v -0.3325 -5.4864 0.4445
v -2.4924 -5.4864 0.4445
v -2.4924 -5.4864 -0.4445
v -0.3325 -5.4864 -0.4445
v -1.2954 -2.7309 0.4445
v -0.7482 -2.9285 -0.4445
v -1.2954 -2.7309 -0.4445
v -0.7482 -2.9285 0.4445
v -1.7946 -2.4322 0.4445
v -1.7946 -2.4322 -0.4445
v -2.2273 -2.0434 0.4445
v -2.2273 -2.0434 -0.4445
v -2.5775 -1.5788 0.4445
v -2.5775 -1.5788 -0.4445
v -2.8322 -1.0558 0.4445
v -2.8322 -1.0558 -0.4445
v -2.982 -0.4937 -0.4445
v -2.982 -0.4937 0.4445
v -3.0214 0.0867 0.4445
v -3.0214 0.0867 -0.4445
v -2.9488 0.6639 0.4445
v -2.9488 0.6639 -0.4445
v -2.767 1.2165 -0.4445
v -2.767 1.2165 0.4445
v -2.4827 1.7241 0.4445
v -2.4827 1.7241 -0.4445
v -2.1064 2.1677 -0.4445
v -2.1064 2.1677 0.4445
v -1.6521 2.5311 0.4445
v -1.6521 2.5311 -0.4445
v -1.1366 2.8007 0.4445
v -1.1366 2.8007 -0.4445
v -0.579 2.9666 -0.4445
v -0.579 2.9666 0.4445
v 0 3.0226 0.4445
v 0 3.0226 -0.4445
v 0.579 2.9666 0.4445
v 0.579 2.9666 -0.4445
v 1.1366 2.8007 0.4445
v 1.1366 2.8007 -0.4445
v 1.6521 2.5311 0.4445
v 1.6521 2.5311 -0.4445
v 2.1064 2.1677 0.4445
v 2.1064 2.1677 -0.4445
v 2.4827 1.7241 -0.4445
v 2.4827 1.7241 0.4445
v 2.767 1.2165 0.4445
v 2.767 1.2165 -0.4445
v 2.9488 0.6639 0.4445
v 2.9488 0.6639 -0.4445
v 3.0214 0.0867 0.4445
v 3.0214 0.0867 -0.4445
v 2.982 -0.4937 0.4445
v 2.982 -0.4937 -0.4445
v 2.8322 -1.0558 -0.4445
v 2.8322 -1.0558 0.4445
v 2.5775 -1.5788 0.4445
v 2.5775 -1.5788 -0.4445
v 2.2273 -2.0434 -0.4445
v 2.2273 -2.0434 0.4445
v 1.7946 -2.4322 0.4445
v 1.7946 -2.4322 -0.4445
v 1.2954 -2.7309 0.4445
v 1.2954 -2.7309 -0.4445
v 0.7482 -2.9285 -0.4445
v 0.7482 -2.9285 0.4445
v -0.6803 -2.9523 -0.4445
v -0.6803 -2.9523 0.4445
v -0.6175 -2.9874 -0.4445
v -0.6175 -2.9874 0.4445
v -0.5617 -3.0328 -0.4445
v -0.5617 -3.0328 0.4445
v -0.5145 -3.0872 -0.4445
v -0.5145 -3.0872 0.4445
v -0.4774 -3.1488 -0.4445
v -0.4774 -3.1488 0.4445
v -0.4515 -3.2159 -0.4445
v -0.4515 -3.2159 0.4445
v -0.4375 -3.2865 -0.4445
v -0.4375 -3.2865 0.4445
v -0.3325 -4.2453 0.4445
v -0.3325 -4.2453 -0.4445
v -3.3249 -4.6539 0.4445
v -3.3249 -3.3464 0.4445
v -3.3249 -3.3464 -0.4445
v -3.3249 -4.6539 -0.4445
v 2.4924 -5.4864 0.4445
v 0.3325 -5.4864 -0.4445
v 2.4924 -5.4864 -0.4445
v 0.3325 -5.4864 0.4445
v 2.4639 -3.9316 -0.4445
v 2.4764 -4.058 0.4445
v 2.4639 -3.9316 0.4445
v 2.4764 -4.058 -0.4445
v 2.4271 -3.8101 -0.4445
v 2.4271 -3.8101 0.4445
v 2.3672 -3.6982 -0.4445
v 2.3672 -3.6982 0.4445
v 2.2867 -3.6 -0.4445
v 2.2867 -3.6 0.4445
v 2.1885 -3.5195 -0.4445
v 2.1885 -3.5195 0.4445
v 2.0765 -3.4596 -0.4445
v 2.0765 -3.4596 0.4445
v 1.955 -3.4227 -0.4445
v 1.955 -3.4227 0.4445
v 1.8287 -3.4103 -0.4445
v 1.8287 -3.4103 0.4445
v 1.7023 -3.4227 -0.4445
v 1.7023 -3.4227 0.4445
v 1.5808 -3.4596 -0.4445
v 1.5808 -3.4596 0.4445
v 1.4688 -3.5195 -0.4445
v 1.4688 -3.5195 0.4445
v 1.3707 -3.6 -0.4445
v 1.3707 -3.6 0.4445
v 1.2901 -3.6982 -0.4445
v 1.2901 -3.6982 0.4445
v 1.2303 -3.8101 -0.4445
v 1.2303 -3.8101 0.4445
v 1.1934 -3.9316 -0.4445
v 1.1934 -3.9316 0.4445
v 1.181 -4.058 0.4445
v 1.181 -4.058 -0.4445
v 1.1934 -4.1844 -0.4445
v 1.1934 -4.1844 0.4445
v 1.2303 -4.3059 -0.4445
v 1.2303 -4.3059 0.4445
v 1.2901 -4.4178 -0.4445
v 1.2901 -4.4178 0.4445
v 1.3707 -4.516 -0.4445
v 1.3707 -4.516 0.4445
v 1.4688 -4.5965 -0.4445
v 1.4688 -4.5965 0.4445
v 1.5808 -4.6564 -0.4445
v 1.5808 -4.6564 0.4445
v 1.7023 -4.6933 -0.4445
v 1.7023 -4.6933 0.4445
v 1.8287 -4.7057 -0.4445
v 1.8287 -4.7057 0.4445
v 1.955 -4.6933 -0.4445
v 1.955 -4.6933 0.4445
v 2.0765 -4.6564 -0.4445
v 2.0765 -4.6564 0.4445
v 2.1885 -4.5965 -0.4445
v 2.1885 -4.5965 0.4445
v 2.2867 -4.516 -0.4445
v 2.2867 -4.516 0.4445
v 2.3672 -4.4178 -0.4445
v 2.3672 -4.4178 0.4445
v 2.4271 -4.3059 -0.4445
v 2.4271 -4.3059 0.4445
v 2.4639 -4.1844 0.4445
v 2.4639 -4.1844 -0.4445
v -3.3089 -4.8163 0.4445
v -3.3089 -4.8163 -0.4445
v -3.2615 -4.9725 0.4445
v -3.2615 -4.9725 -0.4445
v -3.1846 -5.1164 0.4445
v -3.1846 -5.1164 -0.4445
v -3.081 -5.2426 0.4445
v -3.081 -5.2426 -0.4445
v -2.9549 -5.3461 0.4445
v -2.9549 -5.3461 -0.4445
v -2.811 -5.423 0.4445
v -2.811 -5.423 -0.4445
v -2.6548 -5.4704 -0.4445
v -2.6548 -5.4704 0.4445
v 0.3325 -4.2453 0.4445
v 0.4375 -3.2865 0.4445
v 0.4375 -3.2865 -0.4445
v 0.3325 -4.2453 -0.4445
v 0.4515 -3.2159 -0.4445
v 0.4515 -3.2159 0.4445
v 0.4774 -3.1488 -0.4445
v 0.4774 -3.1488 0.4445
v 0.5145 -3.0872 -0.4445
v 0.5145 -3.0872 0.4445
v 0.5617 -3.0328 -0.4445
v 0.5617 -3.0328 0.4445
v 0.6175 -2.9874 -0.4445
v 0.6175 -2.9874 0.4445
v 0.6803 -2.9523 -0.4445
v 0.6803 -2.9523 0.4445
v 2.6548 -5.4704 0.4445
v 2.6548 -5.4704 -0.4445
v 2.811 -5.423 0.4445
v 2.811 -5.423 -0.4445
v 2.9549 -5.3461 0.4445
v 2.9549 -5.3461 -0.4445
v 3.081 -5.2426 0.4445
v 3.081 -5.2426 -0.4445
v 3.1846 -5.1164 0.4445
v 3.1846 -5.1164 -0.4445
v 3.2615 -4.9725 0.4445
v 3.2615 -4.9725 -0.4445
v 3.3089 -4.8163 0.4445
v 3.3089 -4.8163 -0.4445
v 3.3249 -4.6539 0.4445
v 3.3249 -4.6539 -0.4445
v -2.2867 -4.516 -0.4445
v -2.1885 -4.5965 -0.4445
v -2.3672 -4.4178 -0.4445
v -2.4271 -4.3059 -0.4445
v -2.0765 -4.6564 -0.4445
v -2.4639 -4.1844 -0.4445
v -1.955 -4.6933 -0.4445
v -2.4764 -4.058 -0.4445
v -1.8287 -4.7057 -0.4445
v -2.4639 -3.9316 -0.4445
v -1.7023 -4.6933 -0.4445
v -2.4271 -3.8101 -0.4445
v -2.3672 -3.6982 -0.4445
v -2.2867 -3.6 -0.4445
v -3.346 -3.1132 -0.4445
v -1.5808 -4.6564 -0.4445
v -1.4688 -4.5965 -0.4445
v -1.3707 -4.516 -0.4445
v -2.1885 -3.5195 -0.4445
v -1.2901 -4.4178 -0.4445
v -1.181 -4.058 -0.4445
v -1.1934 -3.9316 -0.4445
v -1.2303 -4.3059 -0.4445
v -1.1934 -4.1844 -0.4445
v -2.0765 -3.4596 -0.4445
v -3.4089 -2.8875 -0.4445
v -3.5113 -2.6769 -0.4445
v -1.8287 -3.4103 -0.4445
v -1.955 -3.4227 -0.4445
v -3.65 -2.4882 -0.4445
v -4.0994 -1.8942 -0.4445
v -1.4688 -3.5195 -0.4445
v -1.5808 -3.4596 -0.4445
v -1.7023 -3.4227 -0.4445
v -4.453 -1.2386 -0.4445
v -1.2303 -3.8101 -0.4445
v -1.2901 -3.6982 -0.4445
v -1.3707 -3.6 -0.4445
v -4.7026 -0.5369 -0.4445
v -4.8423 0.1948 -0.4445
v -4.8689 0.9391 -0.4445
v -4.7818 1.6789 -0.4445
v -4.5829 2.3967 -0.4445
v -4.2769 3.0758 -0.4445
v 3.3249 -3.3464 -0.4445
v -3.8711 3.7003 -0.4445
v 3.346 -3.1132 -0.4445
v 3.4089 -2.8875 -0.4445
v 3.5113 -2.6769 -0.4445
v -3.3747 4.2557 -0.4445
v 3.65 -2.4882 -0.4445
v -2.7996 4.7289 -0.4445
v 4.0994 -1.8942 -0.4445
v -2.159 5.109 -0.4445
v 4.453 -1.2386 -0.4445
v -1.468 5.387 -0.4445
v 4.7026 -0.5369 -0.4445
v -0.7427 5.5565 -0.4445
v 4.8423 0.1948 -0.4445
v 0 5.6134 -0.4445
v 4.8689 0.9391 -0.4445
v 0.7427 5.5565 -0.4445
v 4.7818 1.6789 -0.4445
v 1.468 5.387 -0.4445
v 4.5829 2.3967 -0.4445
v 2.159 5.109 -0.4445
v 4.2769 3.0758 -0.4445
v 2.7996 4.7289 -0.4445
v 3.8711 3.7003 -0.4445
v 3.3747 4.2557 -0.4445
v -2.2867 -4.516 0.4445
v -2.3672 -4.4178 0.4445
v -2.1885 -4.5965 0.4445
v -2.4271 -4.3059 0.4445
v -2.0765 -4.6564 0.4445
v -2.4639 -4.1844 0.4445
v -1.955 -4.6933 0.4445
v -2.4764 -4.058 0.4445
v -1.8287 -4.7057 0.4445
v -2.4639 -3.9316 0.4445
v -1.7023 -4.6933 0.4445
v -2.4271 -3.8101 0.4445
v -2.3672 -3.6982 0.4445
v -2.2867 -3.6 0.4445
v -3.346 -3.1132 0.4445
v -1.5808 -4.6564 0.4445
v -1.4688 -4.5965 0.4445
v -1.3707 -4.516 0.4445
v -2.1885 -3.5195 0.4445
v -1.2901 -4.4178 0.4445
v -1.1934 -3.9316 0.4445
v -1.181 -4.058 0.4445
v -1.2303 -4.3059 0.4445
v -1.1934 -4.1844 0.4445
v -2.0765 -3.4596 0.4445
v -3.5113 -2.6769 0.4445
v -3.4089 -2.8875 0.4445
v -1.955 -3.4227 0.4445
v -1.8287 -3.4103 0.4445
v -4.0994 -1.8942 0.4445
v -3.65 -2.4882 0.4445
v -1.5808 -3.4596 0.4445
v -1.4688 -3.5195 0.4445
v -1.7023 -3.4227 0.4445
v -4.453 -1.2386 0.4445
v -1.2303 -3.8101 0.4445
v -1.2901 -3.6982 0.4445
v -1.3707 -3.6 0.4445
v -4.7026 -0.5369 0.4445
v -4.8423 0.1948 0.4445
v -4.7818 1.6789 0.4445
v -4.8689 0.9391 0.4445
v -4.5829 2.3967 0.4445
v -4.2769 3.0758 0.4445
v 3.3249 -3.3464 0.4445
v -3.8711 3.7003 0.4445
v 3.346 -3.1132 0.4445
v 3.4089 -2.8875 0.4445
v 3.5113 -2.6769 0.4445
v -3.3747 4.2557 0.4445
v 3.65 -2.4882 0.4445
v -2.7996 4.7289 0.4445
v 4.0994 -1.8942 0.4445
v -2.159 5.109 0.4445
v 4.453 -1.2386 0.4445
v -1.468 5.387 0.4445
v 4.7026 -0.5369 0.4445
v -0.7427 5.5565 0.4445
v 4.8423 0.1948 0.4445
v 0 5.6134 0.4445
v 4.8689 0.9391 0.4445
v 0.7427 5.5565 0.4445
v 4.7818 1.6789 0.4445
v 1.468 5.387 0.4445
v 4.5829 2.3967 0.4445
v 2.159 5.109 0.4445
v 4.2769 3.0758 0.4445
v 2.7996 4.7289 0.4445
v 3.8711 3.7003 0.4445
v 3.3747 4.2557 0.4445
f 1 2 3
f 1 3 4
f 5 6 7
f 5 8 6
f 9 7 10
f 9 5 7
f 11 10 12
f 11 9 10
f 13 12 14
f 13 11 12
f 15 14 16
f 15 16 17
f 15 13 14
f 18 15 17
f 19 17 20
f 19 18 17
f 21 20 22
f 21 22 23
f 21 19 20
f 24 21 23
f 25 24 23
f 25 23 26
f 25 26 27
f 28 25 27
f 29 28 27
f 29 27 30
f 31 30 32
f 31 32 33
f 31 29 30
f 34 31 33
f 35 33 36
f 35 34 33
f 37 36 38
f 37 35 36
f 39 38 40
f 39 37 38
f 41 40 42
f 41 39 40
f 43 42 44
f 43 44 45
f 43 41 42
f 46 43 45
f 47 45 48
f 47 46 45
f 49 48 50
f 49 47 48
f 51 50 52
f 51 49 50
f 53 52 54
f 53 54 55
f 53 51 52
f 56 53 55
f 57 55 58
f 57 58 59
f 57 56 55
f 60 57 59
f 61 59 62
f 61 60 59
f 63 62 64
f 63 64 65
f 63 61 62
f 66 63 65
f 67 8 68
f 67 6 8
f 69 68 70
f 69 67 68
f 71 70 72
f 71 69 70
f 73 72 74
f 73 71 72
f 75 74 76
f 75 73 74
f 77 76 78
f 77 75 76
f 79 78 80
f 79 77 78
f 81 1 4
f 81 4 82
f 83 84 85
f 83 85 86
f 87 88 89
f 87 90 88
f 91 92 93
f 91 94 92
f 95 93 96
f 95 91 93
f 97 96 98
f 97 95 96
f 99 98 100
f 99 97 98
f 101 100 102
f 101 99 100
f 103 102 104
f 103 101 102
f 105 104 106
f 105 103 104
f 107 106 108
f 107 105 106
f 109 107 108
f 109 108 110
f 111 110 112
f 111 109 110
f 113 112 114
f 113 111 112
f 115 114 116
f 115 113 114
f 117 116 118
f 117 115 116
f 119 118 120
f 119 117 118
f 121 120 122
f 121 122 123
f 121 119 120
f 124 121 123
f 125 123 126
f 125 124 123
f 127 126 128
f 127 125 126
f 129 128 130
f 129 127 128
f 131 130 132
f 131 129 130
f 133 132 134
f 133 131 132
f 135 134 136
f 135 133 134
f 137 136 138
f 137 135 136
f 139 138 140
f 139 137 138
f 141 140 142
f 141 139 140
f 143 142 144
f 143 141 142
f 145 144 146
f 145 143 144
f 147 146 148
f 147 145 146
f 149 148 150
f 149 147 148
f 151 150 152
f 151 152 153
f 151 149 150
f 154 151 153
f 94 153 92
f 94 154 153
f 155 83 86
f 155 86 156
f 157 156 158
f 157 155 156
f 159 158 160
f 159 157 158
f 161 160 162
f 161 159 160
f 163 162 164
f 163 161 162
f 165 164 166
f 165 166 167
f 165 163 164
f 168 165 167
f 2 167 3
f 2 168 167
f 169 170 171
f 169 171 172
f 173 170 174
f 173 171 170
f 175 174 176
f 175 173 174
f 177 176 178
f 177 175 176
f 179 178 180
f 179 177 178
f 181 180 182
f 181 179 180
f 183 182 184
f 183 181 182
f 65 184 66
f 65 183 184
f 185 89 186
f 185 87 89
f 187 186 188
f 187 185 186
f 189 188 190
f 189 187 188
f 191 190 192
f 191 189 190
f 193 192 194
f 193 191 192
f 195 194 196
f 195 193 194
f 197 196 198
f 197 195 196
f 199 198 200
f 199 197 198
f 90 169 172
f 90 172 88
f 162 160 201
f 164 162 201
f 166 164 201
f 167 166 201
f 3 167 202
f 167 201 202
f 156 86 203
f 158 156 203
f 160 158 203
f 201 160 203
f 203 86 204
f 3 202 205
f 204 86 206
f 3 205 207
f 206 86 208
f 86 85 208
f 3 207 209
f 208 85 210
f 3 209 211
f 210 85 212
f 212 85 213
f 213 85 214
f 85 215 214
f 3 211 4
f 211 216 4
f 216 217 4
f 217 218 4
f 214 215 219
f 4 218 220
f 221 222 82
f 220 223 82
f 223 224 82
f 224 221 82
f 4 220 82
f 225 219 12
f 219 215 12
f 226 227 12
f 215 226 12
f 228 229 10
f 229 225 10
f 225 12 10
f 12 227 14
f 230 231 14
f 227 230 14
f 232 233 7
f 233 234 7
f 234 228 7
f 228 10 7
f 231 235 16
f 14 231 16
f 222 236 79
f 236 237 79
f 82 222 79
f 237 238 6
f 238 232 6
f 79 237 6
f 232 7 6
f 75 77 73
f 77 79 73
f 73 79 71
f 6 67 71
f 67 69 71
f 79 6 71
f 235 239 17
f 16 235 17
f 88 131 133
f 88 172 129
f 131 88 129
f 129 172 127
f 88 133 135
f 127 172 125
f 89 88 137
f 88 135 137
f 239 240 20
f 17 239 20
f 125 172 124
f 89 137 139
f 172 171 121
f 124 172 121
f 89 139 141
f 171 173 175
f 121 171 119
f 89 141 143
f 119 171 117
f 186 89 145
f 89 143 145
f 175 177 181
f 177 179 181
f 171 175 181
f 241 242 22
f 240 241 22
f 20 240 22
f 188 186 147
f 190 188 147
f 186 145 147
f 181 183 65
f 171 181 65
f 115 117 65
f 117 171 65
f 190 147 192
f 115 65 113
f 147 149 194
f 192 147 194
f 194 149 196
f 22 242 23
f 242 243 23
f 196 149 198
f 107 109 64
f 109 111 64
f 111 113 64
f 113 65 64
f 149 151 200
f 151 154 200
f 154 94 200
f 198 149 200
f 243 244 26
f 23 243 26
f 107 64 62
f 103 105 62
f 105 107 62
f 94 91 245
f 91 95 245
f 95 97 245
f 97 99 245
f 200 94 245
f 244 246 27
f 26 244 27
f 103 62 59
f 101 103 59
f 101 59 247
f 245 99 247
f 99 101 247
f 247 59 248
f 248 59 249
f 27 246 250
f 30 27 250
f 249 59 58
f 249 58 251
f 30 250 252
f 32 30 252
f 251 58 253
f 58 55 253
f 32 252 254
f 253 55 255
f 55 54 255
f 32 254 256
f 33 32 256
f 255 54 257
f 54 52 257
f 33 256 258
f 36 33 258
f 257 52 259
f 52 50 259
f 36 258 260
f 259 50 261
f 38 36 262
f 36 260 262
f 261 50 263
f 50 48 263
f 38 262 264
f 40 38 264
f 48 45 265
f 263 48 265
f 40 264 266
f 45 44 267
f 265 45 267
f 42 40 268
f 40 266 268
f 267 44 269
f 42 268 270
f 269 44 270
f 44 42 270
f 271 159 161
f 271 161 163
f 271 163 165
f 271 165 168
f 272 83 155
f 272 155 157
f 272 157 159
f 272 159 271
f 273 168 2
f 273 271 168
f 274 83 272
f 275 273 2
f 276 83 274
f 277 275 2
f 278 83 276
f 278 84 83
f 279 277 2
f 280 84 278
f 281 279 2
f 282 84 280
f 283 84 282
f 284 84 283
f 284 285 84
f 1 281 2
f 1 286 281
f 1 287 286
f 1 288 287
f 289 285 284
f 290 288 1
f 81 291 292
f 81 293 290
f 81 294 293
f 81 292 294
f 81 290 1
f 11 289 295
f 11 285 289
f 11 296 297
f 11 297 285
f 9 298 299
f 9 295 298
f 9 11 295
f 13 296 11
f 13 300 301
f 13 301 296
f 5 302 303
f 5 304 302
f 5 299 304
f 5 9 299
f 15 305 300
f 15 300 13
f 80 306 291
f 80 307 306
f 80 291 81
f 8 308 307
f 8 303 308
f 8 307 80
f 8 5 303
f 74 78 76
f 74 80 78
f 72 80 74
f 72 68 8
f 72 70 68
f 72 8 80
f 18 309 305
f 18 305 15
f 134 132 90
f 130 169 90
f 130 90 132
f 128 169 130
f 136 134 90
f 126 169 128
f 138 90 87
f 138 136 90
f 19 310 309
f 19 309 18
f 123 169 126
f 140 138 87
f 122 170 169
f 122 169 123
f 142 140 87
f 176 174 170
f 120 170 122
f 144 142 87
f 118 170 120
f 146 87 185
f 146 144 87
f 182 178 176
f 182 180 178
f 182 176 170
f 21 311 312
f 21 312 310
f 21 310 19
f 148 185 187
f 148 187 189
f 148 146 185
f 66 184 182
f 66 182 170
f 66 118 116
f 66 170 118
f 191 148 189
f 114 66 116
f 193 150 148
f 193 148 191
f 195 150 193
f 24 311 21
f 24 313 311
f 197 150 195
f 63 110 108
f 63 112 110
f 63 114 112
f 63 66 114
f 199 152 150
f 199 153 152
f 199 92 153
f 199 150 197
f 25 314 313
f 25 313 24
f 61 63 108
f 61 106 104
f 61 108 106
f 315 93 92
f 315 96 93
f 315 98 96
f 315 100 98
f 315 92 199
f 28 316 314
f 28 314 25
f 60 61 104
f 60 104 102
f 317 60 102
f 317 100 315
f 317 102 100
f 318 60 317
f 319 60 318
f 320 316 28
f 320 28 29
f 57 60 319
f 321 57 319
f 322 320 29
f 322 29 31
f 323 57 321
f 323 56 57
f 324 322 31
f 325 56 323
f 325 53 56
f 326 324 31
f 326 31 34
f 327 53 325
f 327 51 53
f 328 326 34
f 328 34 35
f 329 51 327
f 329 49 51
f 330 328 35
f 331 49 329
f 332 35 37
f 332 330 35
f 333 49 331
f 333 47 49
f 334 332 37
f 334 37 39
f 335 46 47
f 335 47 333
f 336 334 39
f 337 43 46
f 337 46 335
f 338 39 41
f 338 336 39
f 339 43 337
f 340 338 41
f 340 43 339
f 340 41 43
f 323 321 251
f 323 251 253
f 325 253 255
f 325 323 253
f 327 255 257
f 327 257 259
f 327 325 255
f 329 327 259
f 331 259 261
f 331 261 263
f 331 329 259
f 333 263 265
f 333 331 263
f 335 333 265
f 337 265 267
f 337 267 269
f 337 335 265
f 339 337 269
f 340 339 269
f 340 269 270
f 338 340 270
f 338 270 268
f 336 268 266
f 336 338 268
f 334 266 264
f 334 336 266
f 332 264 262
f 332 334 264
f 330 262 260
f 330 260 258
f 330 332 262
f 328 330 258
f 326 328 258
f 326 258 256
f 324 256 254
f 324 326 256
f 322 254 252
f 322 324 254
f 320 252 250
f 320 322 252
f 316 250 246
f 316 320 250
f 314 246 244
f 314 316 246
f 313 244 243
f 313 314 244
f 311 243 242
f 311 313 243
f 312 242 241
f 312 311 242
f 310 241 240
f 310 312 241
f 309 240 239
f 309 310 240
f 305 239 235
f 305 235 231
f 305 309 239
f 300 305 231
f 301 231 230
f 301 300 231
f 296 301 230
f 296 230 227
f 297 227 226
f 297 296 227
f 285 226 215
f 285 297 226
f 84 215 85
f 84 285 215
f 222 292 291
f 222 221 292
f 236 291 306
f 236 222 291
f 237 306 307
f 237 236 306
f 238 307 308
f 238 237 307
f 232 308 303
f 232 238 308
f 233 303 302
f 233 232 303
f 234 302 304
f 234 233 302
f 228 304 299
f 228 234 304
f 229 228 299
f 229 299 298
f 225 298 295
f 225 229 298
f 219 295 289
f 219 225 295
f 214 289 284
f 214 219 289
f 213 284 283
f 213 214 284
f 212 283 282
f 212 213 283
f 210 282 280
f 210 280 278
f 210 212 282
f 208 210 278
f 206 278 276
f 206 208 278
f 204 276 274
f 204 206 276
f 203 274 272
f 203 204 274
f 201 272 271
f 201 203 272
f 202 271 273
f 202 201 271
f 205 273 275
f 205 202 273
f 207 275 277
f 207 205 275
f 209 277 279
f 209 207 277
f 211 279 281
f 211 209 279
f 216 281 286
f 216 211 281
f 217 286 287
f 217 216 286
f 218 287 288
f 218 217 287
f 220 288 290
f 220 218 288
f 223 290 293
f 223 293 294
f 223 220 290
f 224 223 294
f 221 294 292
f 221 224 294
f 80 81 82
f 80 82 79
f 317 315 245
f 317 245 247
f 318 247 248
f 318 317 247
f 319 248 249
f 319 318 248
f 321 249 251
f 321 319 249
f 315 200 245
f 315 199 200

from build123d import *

# Parameters (mm, degrees)
SKETCH3_R               = 0.6477
BOSS_EXTRUDE1_DEPTH     = 0.4445
CUT_EXTRUDE1_DEPTH      = 1.4445
CUT_EXTRUDE1_DEPTH_BACK = 1.4445
FILLET1_R               = 0.4162425


with BuildPart() as part:
    # Sketch3 → Boss-Extrude1 (new body, symmetric)
    with BuildSketch(Plane.XY):
        with BuildLine():
            Line((3.32486, -4.653915), (3.32486, -3.346426518))
            ThreePointArc((3.32486, -3.346426518), (3.408862886, -2.887538523), (3.649976862, -2.488165606))
            ThreePointArc((3.649976862, -2.488165606), (0, 5.6134), (-3.649976862, -2.488165606))
            ThreePointArc((-3.649976862, -2.488165606), (-3.408862886, -2.887538523), (-3.32486, -3.346426518))
            Line((-3.32486, -3.346426518), (-3.32486, -4.653915))
            ThreePointArc((-3.32486, -4.653915), (-3.081030789, -5.242570789), (-2.492375, -5.4864))
            Line((-2.492375, -5.4864), (-0.332486, -5.4864))
            Line((-0.332486, -5.4864), (-0.332486, -3.004257615))
            ThreePointArc((-0.332486, -3.004257615), (0, 3.0226), (0.332486, -3.004257615))
            Line((0.332486, -3.004257615), (0.332486, -5.4864))
            Line((0.332486, -5.4864), (2.492375, -5.4864))
            ThreePointArc((2.492375, -5.4864), (3.081030789, -5.242570789), (3.32486, -4.653915))
        make_face()
        with Locations((-1.828673, -4.057999533)):
            Circle(SKETCH3_R, mode=Mode.SUBTRACT)
        with Locations((1.828673, -4.057999533)):
            Circle(SKETCH3_R, mode=Mode.SUBTRACT)
    extrude(amount=BOSS_EXTRUDE1_DEPTH, both=True)

    # Sketch4 → Cut-Extrude1 (cut, two sides)
    with BuildSketch(Plane.XY) as cut_extrude1_sk:
        Polygon((-0.332486, -4.245328808), (-0.797425121, 0), (0.797425121, 0), (0.332486, -4.245328808), align=None)
    extrude(amount=CUT_EXTRUDE1_DEPTH, mode=Mode.SUBTRACT)
    extrude(cut_extrude1_sk.sketch, amount=-CUT_EXTRUDE1_DEPTH_BACK, mode=Mode.SUBTRACT)

    # Fillet1
    fillet1_edges = [part.edges().sort_by_distance(p)[0] for p in [
        (-0.470430427, -2.985767234, 0),
        (0.470430427, -2.985767234, 0),
    ]]
    fillet(fillet1_edges, radius=FILLET1_R)


solid = part.part
